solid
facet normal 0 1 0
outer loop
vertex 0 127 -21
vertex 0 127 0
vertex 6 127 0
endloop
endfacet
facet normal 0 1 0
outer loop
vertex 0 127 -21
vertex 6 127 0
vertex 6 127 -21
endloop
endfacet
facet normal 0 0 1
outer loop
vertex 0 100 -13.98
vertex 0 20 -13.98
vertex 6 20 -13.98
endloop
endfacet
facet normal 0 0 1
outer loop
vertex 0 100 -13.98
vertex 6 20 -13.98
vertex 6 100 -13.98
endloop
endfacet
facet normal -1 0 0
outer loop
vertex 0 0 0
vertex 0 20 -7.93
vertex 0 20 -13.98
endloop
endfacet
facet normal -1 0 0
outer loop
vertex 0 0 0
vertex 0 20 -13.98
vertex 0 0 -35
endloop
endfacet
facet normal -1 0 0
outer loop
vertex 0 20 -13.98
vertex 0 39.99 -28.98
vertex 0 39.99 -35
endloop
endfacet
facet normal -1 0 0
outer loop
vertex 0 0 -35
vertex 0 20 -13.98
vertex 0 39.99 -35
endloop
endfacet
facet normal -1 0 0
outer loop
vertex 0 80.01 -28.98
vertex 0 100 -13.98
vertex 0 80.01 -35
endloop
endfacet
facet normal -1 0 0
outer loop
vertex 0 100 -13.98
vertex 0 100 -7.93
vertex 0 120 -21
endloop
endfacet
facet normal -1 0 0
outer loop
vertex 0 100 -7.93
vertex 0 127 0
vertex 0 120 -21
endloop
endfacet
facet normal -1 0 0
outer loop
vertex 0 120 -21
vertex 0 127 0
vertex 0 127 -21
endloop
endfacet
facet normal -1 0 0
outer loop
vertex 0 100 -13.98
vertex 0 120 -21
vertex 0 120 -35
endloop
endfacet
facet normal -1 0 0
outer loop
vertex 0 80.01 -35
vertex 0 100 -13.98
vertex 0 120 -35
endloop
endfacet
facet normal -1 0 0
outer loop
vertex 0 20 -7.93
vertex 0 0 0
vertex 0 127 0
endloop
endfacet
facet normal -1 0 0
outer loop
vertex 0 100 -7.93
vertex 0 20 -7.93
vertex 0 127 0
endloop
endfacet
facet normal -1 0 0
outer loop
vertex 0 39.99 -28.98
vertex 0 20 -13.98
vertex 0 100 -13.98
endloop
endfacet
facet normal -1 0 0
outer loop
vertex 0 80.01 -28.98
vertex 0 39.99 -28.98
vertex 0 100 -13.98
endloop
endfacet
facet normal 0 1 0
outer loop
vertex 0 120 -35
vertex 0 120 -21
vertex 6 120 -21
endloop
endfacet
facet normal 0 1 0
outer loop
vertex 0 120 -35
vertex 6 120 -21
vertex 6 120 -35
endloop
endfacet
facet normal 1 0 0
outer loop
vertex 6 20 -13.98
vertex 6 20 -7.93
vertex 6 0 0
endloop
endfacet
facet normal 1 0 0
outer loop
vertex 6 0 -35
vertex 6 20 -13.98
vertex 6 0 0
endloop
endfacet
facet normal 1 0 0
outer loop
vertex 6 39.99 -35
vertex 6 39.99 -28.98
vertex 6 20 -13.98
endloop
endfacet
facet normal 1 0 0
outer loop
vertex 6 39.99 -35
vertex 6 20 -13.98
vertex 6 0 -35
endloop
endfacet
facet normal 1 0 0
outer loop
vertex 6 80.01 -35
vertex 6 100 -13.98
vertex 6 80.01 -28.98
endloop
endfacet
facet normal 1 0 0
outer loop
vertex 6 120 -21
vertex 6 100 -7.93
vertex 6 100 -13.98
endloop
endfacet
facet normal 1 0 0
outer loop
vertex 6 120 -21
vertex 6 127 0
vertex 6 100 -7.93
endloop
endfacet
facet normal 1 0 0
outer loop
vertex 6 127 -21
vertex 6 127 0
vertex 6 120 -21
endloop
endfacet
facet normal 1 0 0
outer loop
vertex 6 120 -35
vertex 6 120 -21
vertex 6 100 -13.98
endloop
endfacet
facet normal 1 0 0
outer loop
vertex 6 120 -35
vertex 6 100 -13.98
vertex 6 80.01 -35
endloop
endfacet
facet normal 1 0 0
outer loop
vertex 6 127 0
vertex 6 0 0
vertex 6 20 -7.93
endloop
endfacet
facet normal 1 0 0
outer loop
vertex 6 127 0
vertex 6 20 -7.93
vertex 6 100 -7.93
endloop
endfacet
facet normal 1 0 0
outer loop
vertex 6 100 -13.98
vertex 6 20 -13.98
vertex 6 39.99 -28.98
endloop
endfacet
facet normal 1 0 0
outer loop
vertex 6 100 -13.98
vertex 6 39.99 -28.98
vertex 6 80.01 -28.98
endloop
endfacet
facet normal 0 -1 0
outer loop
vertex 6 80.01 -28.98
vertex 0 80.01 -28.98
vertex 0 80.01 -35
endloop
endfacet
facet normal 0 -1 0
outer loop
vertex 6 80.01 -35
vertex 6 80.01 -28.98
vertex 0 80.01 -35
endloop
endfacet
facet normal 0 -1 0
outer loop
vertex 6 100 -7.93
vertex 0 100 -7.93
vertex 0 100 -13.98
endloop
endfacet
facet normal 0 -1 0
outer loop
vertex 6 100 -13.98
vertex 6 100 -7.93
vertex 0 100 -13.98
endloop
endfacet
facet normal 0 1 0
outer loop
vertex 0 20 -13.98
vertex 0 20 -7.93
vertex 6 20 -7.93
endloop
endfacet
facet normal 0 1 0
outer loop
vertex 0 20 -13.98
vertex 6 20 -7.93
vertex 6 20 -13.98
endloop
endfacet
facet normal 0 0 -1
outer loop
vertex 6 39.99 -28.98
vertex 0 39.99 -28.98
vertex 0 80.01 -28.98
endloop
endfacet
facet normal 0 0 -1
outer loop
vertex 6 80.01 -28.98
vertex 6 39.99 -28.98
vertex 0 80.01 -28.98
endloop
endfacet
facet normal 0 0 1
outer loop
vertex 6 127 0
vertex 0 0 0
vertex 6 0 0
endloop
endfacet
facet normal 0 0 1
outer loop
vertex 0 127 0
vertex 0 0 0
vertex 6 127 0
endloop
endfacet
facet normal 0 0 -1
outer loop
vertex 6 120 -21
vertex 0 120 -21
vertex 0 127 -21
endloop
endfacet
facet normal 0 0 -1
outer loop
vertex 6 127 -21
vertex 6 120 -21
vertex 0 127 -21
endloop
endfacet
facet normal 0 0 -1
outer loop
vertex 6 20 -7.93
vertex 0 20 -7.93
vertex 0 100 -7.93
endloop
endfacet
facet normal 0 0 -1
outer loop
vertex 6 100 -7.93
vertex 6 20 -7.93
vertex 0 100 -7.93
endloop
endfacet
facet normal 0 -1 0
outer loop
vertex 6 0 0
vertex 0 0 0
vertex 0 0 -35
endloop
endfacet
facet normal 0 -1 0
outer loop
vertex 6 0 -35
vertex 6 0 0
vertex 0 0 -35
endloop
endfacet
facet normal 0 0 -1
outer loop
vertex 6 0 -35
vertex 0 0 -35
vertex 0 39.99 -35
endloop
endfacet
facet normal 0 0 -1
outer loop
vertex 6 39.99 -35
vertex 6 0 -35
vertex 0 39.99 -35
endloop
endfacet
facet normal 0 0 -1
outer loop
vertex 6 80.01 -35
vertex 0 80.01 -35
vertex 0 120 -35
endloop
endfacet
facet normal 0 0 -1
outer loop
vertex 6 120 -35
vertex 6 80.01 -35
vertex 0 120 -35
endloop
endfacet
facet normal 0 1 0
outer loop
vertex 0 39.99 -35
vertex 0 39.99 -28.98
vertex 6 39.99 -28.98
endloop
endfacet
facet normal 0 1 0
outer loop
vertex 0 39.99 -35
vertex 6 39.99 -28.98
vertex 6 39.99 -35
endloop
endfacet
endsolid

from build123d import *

# Parameters (mm, degrees)
CROQUIS1_W              = 35
CROQUIS1_H              = 120
SALIENTE_EXTRUIR1_DEPTH = 6
CROQUIS3_W              = 6.02
CROQUIS3_H              = 40.02
CORTAR_EXTRUIR1_DEPTH   = 126.143917151
CROQUIS4_W              = 6.05
CROQUIS4_H              = 80
CORTAR_EXTRUIR2_DEPTH   = 10
CROQUIS5_W              = 21
CROQUIS5_H              = 7
SALIENTE_EXTRUIR2_DEPTH = 6


with BuildPart() as part:
    # Croquis1 → Saliente-Extruir1 (new body)
    with BuildSketch(Plane(origin=(0, 0, 0), x_dir=(0, 0, -1), z_dir=(1, 0, 0))):
        with Locations((17.5, 60)):
            Rectangle(CROQUIS1_W, CROQUIS1_H)
    extrude(amount=SALIENTE_EXTRUIR1_DEPTH)

    # Croquis3 → Cortar-Extruir1 (cut, through all)
    with BuildSketch(Plane(origin=(0, 0, 0), x_dir=(0, 0, -1), z_dir=(1, 0, 0))):
        with Locations((31.99, 60)):
            Rectangle(CROQUIS3_W, CROQUIS3_H)
    extrude(amount=CORTAR_EXTRUIR1_DEPTH, mode=Mode.SUBTRACT)

    # Croquis4 → Cortar-Extruir2 (cut)
    with BuildSketch(Plane(origin=(0, 0, 0), x_dir=(0, 0, -1), z_dir=(1, 0, 0))):
        with Locations((10.955, 60)):
            Rectangle(CROQUIS4_W, CROQUIS4_H)
    extrude(amount=CORTAR_EXTRUIR2_DEPTH, mode=Mode.SUBTRACT)

    # Croquis5 → Saliente-Extruir2 (add)
    with BuildSketch(Plane(origin=(0, 0, 0), x_dir=(0, 0, -1), z_dir=(1, 0, 0))):
        with Locations((10.5, 123.5)):
            Rectangle(CROQUIS5_W, CROQUIS5_H)
    extrude(amount=SALIENTE_EXTRUIR2_DEPTH)


solid = part.part
